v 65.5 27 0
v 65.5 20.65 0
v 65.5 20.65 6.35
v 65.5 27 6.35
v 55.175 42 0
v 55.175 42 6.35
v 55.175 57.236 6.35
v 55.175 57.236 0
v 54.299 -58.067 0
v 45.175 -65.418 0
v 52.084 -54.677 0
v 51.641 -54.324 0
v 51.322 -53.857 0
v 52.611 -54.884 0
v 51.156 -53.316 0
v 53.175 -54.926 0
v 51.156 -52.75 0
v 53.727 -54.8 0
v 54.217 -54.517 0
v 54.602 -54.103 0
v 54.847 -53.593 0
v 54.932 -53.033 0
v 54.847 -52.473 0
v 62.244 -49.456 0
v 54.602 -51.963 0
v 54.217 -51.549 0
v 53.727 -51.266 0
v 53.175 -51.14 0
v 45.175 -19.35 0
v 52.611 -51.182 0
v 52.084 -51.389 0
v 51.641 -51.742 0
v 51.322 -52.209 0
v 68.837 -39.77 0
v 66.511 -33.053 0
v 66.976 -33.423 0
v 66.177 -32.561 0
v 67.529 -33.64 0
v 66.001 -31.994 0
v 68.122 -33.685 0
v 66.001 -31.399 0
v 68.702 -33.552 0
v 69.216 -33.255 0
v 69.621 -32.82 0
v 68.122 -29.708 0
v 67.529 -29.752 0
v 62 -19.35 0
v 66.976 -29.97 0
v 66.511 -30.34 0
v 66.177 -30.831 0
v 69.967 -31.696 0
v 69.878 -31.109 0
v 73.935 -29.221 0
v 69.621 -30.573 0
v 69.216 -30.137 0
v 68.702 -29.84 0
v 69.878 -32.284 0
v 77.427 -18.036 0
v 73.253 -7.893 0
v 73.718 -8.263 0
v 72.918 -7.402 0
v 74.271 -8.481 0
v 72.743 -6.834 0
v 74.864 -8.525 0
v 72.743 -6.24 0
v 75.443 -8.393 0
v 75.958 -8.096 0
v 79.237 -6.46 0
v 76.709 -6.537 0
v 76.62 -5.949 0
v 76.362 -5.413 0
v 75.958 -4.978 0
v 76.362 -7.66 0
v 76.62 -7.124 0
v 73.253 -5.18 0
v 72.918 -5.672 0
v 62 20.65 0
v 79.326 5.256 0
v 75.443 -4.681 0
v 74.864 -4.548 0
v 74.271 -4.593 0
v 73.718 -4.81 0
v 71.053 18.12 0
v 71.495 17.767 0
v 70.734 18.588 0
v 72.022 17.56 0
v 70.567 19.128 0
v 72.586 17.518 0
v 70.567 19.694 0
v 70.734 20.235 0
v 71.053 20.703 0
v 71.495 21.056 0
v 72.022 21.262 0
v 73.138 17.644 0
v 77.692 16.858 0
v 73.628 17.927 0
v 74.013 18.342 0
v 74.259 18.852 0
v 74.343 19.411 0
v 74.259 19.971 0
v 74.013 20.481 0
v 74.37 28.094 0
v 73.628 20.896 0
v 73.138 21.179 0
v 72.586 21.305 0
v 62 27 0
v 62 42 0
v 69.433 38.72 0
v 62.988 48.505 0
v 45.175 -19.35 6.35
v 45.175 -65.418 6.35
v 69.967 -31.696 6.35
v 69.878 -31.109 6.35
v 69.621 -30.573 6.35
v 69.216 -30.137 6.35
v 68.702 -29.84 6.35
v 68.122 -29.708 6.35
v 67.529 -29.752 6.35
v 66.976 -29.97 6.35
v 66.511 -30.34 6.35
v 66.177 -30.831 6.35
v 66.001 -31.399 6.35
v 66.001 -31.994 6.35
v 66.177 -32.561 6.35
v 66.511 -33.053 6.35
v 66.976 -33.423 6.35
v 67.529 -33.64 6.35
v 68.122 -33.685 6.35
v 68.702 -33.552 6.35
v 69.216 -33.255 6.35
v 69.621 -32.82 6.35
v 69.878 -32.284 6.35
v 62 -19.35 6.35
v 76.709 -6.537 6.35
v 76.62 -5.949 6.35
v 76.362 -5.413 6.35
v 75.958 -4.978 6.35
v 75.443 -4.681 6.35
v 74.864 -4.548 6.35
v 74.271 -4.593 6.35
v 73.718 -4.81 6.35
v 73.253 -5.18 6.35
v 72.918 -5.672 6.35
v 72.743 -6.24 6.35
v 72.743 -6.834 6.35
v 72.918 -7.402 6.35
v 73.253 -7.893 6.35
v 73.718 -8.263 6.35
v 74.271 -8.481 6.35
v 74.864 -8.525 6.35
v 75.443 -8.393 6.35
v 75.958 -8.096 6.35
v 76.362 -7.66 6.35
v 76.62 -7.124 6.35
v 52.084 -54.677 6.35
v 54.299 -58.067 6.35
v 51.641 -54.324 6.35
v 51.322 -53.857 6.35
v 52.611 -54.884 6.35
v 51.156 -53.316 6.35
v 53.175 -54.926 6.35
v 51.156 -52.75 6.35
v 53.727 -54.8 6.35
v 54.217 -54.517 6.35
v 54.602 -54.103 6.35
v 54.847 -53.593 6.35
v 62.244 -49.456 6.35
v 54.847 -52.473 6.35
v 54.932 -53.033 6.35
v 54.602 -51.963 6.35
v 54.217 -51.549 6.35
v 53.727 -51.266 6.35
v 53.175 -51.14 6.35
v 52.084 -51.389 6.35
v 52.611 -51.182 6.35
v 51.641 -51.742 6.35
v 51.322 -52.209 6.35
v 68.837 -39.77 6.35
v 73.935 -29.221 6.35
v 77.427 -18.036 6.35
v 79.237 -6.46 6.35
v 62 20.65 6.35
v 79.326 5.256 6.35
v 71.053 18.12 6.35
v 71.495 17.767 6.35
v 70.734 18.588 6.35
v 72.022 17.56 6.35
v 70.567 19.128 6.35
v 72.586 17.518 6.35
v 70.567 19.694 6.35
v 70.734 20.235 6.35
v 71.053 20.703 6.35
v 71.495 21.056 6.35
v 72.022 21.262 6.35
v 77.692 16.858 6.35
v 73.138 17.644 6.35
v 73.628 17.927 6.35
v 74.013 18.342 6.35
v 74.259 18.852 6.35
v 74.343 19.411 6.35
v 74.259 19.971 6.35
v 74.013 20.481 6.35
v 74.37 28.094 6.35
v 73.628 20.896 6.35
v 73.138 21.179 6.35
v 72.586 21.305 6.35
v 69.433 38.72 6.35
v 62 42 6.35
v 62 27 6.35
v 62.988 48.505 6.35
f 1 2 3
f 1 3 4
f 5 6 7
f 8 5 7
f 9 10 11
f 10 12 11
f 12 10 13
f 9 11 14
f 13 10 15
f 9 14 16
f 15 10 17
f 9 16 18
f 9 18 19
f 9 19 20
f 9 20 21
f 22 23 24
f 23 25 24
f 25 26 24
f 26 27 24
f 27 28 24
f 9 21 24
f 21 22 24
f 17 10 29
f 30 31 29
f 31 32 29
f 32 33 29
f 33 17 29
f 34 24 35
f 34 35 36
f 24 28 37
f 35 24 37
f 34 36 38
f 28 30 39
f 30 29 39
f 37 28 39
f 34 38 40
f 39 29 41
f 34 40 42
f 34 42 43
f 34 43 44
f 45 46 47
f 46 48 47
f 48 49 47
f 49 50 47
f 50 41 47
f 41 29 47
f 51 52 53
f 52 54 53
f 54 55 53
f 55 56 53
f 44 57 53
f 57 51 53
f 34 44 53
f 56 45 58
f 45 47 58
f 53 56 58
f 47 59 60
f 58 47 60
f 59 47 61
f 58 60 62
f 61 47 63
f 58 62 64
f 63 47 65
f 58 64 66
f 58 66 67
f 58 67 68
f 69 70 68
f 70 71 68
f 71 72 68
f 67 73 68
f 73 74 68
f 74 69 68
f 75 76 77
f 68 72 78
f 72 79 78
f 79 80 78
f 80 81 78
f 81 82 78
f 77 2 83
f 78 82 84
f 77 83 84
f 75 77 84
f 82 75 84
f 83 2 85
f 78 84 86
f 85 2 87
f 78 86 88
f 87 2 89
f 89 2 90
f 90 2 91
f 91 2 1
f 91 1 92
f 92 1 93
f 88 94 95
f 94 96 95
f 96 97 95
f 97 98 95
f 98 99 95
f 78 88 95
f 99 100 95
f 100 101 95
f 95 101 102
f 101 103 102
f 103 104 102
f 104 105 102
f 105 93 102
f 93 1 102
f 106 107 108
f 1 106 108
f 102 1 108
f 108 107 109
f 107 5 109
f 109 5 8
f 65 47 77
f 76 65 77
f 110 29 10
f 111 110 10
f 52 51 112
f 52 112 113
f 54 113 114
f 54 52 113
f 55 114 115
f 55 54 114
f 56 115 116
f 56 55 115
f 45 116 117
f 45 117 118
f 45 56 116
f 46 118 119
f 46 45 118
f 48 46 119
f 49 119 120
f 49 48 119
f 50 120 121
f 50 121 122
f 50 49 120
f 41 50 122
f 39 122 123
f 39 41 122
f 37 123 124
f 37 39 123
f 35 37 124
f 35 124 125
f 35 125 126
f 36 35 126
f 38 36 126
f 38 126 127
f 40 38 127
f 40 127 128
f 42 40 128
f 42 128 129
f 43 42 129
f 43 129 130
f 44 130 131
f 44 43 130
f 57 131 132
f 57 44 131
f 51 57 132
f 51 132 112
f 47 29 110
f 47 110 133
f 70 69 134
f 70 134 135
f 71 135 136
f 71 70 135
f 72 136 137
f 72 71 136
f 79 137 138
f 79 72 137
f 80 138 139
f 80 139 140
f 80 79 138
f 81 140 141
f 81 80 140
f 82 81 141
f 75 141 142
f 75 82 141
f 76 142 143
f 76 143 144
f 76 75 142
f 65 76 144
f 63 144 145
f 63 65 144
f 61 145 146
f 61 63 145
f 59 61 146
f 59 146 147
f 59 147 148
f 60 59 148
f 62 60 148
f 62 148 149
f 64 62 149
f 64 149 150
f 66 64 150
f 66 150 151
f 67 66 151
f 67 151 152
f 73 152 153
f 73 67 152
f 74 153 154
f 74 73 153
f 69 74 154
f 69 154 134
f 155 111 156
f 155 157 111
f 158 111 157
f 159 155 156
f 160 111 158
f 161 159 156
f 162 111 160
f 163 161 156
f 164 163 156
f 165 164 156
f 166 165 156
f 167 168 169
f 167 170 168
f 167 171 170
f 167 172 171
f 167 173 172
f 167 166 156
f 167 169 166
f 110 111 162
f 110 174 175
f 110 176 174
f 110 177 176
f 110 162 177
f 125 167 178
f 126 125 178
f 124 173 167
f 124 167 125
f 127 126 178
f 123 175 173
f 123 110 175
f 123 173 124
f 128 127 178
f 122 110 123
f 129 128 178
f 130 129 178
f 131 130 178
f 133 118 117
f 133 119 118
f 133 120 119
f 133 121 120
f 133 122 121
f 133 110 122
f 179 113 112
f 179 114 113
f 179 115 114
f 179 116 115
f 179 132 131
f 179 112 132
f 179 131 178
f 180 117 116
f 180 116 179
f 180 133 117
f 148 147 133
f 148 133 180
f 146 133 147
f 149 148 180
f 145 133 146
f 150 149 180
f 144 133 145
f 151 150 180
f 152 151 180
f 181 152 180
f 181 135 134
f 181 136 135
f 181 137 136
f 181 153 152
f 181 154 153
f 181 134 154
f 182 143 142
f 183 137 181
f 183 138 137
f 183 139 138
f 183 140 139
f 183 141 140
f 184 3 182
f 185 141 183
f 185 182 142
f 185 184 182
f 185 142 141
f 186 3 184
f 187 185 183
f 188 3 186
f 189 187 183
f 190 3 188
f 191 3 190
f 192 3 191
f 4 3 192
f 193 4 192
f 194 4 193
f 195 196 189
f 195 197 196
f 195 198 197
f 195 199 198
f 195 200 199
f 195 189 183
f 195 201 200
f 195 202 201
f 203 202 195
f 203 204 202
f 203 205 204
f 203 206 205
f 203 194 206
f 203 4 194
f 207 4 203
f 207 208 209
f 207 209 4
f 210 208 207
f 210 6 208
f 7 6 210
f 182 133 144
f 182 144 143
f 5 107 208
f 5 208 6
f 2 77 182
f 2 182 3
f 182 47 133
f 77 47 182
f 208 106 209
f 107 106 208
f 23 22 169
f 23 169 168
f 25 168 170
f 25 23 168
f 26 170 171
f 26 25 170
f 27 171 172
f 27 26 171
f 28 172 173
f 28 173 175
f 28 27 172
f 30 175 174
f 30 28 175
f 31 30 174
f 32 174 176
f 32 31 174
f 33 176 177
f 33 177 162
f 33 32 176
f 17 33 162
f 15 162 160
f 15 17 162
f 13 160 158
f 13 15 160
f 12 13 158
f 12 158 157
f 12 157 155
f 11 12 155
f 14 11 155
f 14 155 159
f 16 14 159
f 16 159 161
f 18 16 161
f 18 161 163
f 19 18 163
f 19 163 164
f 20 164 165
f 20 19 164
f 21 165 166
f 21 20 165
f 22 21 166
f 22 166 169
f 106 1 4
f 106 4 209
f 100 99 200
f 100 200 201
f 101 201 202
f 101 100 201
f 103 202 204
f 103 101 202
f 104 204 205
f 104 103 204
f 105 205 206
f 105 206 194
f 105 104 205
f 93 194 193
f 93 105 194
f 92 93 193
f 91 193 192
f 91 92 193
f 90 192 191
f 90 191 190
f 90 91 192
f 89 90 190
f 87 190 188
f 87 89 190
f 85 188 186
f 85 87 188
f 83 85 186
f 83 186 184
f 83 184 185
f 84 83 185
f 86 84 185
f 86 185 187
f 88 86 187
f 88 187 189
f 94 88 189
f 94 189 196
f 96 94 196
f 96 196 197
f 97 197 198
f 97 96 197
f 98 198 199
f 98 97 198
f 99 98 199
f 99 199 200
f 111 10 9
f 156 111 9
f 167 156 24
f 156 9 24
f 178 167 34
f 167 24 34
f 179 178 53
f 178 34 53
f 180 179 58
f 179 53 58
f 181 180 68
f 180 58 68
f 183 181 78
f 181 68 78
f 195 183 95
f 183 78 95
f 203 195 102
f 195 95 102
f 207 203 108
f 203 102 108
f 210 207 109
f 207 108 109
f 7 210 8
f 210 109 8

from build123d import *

# Parameters (mm, degrees)
SKETCH1_R              = 79.5
SKETCH1_R_2            = 1.9939
SKETCH1_R_3            = 1.89865
SKETCH1_R_4            = 8
BOSS_EXTRUDE1_DEPTH    = 6.35
SKETCH5_W              = 15.2
SKETCH5_H              = 16.075
CUT_EXTRUDE4_DEPTH     = 113.609158153
SKETCH6_R              = 1
CUT_EXTRUDE5_DEPTH     = 113.609158153
FILLET1_R              = 1
SKETCH10_W             = 53.523609979
SKETCH10_H             = 37.243469735
SKETCH10_W_2           = 54.285324016
SKETCH10_H_2           = 37.23416744
BOSS_EXTRUDE2_DEPTH    = 6.35
SKETCH11_W             = 15.2
SKETCH11_H             = 6.55
CUT_EXTRUDE8_DEPTH     = 113.609158153
SKETCH13_R             = 1
CUT_EXTRUDE9_DEPTH     = 113.609158153
FILLET2_R              = 1
LPATTERN3_COUNT        = 2
LPATTERN3_PITCH        = 30
FILLET2_OF_LPATTERN3_R = 1
MIRROR3_DEPTH          = 6.35
CUT_EXTRUDE11_DEPTH    = 113.609158153
SKETCH15_W             = 6.35
SKETCH15_H             = 80
CUT_EXTRUDE12_DEPTH    = 113.609158153
CUT_EXTRUDE14_DEPTH    = 113.609158153
CUT_EXTRUDE18_DEPTH    = 104.150578646


# Read off the part's stored shape, not the designer's step: Mirror3
with BuildPart() as part:
    # Sketch1 → Boss-Extrude1 (new body)
    with BuildSketch(Plane.XY):
        Circle(SKETCH1_R)
        with Locations((74.714602357, -6.536680706)):
            Circle(SKETCH1_R_2, mode=Mode.SUBTRACT)
        with Locations((72.444436972, 19.411428383)):
            Circle(SKETCH1_R_3, mode=Mode.SUBTRACT)
        Circle(SKETCH1_R_4, mode=Mode.SUBTRACT)
        with Locations((67.973084028, -31.696369631)):
            Circle(SKETCH1_R_2, mode=Mode.SUBTRACT)
        with Locations((10.606601718, -10.606601718)):
            Circle(SKETCH1_R_2, mode=Mode.SUBTRACT)
        with Locations((0, -75)):
            Circle(SKETCH1_R_3, mode=Mode.SUBTRACT)
        with Locations((-10.606601718, -10.606601718)):
            Circle(SKETCH1_R_2, mode=Mode.SUBTRACT)
        with Locations((-10.606601718, 10.606601718)):
            Circle(SKETCH1_R_2, mode=Mode.SUBTRACT)
        with Locations((10.606601718, 10.606601718)):
            Circle(SKETCH1_R_2, mode=Mode.SUBTRACT)
        with Locations((-53.033008589, -53.033008589)):
            Circle(SKETCH1_R_3, mode=Mode.SUBTRACT)
        with Locations((-75, 0)):
            Circle(SKETCH1_R_3, mode=Mode.SUBTRACT)
        with Locations((-53.033008589, 53.033008589)):
            Circle(SKETCH1_R_3, mode=Mode.SUBTRACT)
        with Locations((0, 75)):
            Circle(SKETCH1_R_3, mode=Mode.SUBTRACT)
        with Locations((53.033008589, -53.033008589)):
            Circle(SKETCH1_R_3, mode=Mode.SUBTRACT)
    extrude(amount=BOSS_EXTRUDE1_DEPTH)

    # Sketch5 → Cut-Extrude4 (cut, through all)
    with BuildSketch(Plane.XY.offset(6.35)):
        with Locations((-30, -37.9375)):
            Rectangle(SKETCH5_W, SKETCH5_H)
        with Locations((-30, 37.9375)):
            Rectangle(SKETCH5_W, SKETCH5_H)
        with Locations((30, 37.9375)):
            Rectangle(SKETCH5_W, SKETCH5_H)
        with Locations((0, -37.9375)):
            Rectangle(SKETCH5_W, SKETCH5_H)
        with Locations((30, -37.9375)):
            Rectangle(SKETCH5_W, SKETCH5_H)
        with Locations((0, 37.9375)):
            Rectangle(SKETCH5_W, SKETCH5_H)
    extrude(amount=-CUT_EXTRUDE4_DEPTH, mode=Mode.SUBTRACT)

    # Sketch6 → Cut-Extrude5 (cut, through all)
    with BuildSketch(Plane.XY.offset(6.35)):
        with Locations((-37.6, 45.975)):
            Circle(SKETCH6_R)
        with Locations((-22.4, 45.975)):
            Circle(SKETCH6_R)
        with Locations((-37.6, 29.9)):
            Circle(SKETCH6_R)
        with Locations((-22.4, 29.9)):
            Circle(SKETCH6_R)
        with Locations((-7.6, 45.975)):
            Circle(SKETCH6_R)
        with Locations((7.6, 45.975)):
            Circle(SKETCH6_R)
        with Locations((-7.6, 29.9)):
            Circle(SKETCH6_R)
        with Locations((7.6, 29.9)):
            Circle(SKETCH6_R)
        with Locations((22.4, 45.975)):
            Circle(SKETCH6_R)
        with Locations((37.6, 45.975)):
            Circle(SKETCH6_R)
        with Locations((22.4, 29.9)):
            Circle(SKETCH6_R)
        with Locations((37.6, 29.9)):
            Circle(SKETCH6_R)
        with Locations((-37.6, -29.9)):
            Circle(SKETCH6_R)
        with Locations((-22.4, -29.9)):
            Circle(SKETCH6_R)
        with Locations((-37.6, -45.975)):
            Circle(SKETCH6_R)
        with Locations((-22.4, -45.975)):
            Circle(SKETCH6_R)
        with Locations((-7.6, -29.9)):
            Circle(SKETCH6_R)
        with Locations((7.6, -29.9)):
            Circle(SKETCH6_R)
        with Locations((-7.6, -45.975)):
            Circle(SKETCH6_R)
        with Locations((7.6, -45.975)):
            Circle(SKETCH6_R)
        with Locations((22.4, -29.9)):
            Circle(SKETCH6_R)
        with Locations((37.6, -29.9)):
            Circle(SKETCH6_R)
        with Locations((22.4, -45.975)):
            Circle(SKETCH6_R)
        with Locations((37.6, -45.975)):
            Circle(SKETCH6_R)
    extrude(amount=-CUT_EXTRUDE5_DEPTH, mode=Mode.SUBTRACT)

    # Fillet1
    fillet1_edges = [part.edges().sort_by_distance(p)[0] for p in [
        (-37.6, 44.975, 3.175),
        (-36.6, 45.975, 3.175),
        (-22.4, 44.975, 3.175),
        (-23.4, 45.975, 3.175),
        (-37.6, 30.9, 3.175),
        (-36.6, 29.9, 3.175),
        (-23.4, 29.9, 3.175),
        (-22.4, 30.9, 3.175),
        (-7.6, 44.975, 3.175),
        (-6.6, 45.975, 3.175),
        (7.6, 44.975, 3.175),
        (6.6, 45.975, 3.175),
        (-7.6, 30.9, 3.175),
        (-6.6, 29.9, 3.175),
        (6.6, 29.9, 3.175),
        (7.6, 30.9, 3.175),
        (22.4, 44.975, 3.175),
        (23.4, 45.975, 3.175),
        (37.6, 44.975, 3.175),
        (36.6, 45.975, 3.175),
        (22.4, 30.9, 3.175),
        (23.4, 29.9, 3.175),
        (36.6, 29.9, 3.175),
        (37.6, 30.9, 3.175),
        (-36.6, -29.9, 3.175),
        (-37.6, -30.9, 3.175),
        (-22.4, -30.9, 3.175),
        (-23.4, -29.9, 3.175),
        (-36.6, -45.975, 3.175),
        (-37.6, -44.975, 3.175),
        (-23.4, -45.975, 3.175),
        (-22.4, -44.975, 3.175),
        (-6.6, -29.9, 3.175),
        (-7.6, -30.9, 3.175),
        (7.6, -30.9, 3.175),
        (6.6, -29.9, 3.175),
        (-6.6, -45.975, 3.175),
        (-7.6, -44.975, 3.175),
        (6.6, -45.975, 3.175),
        (7.6, -44.975, 3.175),
        (23.4, -29.9, 3.175),
        (22.4, -30.9, 3.175),
        (37.6, -30.9, 3.175),
        (36.6, -29.9, 3.175),
        (23.4, -45.975, 3.175),
        (22.4, -44.975, 3.175),
        (36.6, -45.975, 3.175),
        (37.6, -44.975, 3.175),
    ]]
    fillet(fillet1_edges, radius=FILLET1_R)

    # Sketch10 → Boss-Extrude2 (add, through all)
    with BuildSketch(Plane(origin=(0, 0, 0), x_dir=(-1, 0, 0), z_dir=(0, 0, -1))):
        with Locations((-13.786008458, 43.712822415)):
            Rectangle(SKETCH10_W, SKETCH10_H)
        with Locations((-15.177733449, -42.065637654)):
            Rectangle(SKETCH10_W_2, SKETCH10_H_2)
    extrude(amount=-BOSS_EXTRUDE2_DEPTH)

    # Sketch11 → Cut-Extrude8 (cut, through all)
    with BuildSketch(Plane(origin=(0, 0, 0), x_dir=(-1, 0, 0), z_dir=(0, 0, -1))):
        with Locations((0, 33.175)):
            Rectangle(SKETCH11_W, SKETCH11_H)
    cut_extrude8 = extrude(amount=-CUT_EXTRUDE8_DEPTH, mode=Mode.SUBTRACT)

    # Sketch13 → Cut-Extrude9 (cut, through all)
    with BuildSketch(Plane(origin=(0, 0, 0), x_dir=(-1, 0, 0), z_dir=(0, 0, -1))):
        with Locations((-7.6, 36.45)):
            Circle(SKETCH13_R)
        with Locations((-7.6, 29.9)):
            Circle(SKETCH13_R)
        with Locations((7.6, 29.9)):
            Circle(SKETCH13_R)
        with Locations((7.6, 36.45)):
            Circle(SKETCH13_R)
    cut_extrude9 = extrude(amount=-CUT_EXTRUDE9_DEPTH, mode=Mode.SUBTRACT)

    # Fillet2
    fillet2_edges = [part.edges().sort_by_distance(p)[0] for p in [
        (6.6, 36.45, 3.175),
        (7.6, 35.45, 3.175),
        (-6.6, 36.45, 3.175),
        (7.6, 30.9, 3.175),
        (-6.6, 29.9, 3.175),
        (6.6, 29.9, 3.175),
        (-7.6, 30.9, 3.175),
        (-7.6, 35.45, 3.175),
    ]]
    fillet(fillet2_edges, radius=FILLET2_R)

    # LPattern3: Cut-Extrude8, Cut-Extrude9 ×2
    with Locations(*[(i * LPATTERN3_PITCH, 0, 0) for i in range(1, LPATTERN3_COUNT)]):
        add(cut_extrude8, mode=Mode.SUBTRACT)
        add(cut_extrude9, mode=Mode.SUBTRACT)

    # Fillet2 of LPattern3
    fillet2_of_lpattern3_edges = [part.edges().sort_by_distance(p)[0] for p in [
        (36.6, 36.45, 3.175),
        (37.6, 35.45, 3.175),
        (23.4, 36.45, 3.175),
        (37.6, 30.9, 3.175),
        (23.4, 29.9, 3.175),
        (36.6, 29.9, 3.175),
        (22.4, 30.9, 3.175),
        (22.4, 35.45, 3.175),
    ]]
    fillet(fillet2_of_lpattern3_edges, radius=FILLET2_OF_LPATTERN3_R)

    # Mirror3 outline → Mirror3 (cut)
    with BuildSketch(Plane.XY):
        with BuildLine():
            Line((-5.867949192, -36.45), (5.867949192, -36.45))
            ThreePointArc((5.867949192, -36.45), (6.367949192, -36.583974596), (6.733974596, -36.95))
            ThreePointArc((6.733974596, -36.95), (8.307106781, -37.157106781), (8.1, -35.583974596))
            ThreePointArc((8.1, -35.583974596), (7.733974596, -35.217949192), (7.6, -34.717949192))
            Line((7.6, -34.717949192), (7.6, -31.632050808))
            ThreePointArc((7.6, -31.632050808), (7.733974596, -31.132050808), (8.1, -30.766025404))
            ThreePointArc((8.1, -30.766025404), (8.307106781, -29.192893219), (6.733974596, -29.4))
            ThreePointArc((6.733974596, -29.4), (6.367949192, -29.766025404), (5.867949192, -29.9))
            Line((5.867949192, -29.9), (-5.867949192, -29.9))
            ThreePointArc((-5.867949192, -29.9), (-6.367949192, -29.766025404), (-6.733974596, -29.4))
            ThreePointArc((-6.733974596, -29.4), (-8.307106781, -29.192893219), (-8.1, -30.766025404))
            ThreePointArc((-8.1, -30.766025404), (-7.733974596, -31.132050808), (-7.6, -31.632050808))
            Line((-7.6, -31.632050808), (-7.6, -34.717949192))
            ThreePointArc((-7.6, -34.717949192), (-7.733974596, -35.217949192), (-8.1, -35.583974596))
            ThreePointArc((-8.1, -35.583974596), (-8.307106781, -37.157106781), (-6.733974596, -36.95))
            ThreePointArc((-6.733974596, -36.95), (-6.367949192, -36.583974596), (-5.867949192, -36.45))
        make_face()
        with BuildLine():
            Line((24.132050808, -36.45), (35.867949192, -36.45))
            ThreePointArc((35.867949192, -36.45), (36.367949192, -36.583974596), (36.733974596, -36.95))
            ThreePointArc((36.733974596, -36.95), (38.307106781, -37.157106781), (38.1, -35.583974596))
            ThreePointArc((38.1, -35.583974596), (37.733974596, -35.217949192), (37.6, -34.717949192))
            Line((37.6, -34.717949192), (37.6, -31.632050808))
            ThreePointArc((37.6, -31.632050808), (37.733974596, -31.132050808), (38.1, -30.766025404))
            ThreePointArc((38.1, -30.766025404), (38.307106781, -29.192893219), (36.733974596, -29.4))
            ThreePointArc((36.733974596, -29.4), (36.367949192, -29.766025404), (35.867949192, -29.9))
            Line((35.867949192, -29.9), (24.132050808, -29.9))
            ThreePointArc((24.132050808, -29.9), (23.632050808, -29.766025404), (23.266025404, -29.4))
            ThreePointArc((23.266025404, -29.4), (21.692893219, -29.192893219), (21.9, -30.766025404))
            ThreePointArc((21.9, -30.766025404), (22.266025404, -31.132050808), (22.4, -31.632050808))
            Line((22.4, -31.632050808), (22.4, -34.717949192))
            ThreePointArc((22.4, -34.717949192), (22.266025404, -35.217949192), (21.9, -35.583974596))
            ThreePointArc((21.9, -35.583974596), (21.692893219, -37.157106781), (23.266025404, -36.95))
            ThreePointArc((23.266025404, -36.95), (23.632050808, -36.583974596), (24.132050808, -36.45))
        make_face()
    extrude(amount=MIRROR3_DEPTH, mode=Mode.SUBTRACT)

    # Sketch14 → Cut-Extrude11 (cut, through all)
    with BuildSketch(Plane.XY):
        Polygon((33.5, -19.35), (62, -19.35), (62, 20.65), (65.5, 20.65), (65.5, 27), (62, 27), (62, 42), (42, 42), (42, 27), (38.5, 27), (38.5, 20.65), (42, 20.65), (42, 15.65), (33.5, 15.65), align=None)
    extrude(amount=CUT_EXTRUDE11_DEPTH, mode=Mode.SUBTRACT)

    # Sketch15 → Cut-Extrude12 (cut, through all)
    with BuildSketch(Plane.XY.offset(6.35)):
        with Locations((52, 42)):
            Rectangle(SKETCH15_W, SKETCH15_H)
    extrude(amount=-CUT_EXTRUDE12_DEPTH, mode=Mode.SUBTRACT)

    # Sketch16 → Cut-Extrude14 (cut, through all)
    with BuildSketch(Plane.XY):
        with BuildLine():
            Line((42, -37.5), (42, -14.02059918))
            Line((42, -14.02059918), (45.175, -14.029540215))
            Line((45.175, -14.029540215), (45.175, -79.5))
            Line((45.175, -79.5), (0, -79.5))
            ThreePointArc((0, -79.5), (29.69848481, -67.19848481), (42, -37.5))
        make_face()
        with BuildLine():
            Line((0, 79.5), (45.175, 79.5))
            Line((45.175, 79.5), (45.175, 14.029540215))
            Line((45.175, 14.029540215), (42, 14.02059918))
            Line((42, 14.02059918), (42, 37.5))
            ThreePointArc((42, 37.5), (29.69848481, 67.19848481), (0, 79.5))
        make_face()
    extrude(amount=CUT_EXTRUDE14_DEPTH, mode=Mode.SUBTRACT)


with BuildPart() as cut_extrude14_piece_1:
    # of the separate pieces the step leaves, piece 1, a body of its own (cut_extrude14_pieces_kept)
    add(part.part.solids().sort_by_distance((45.175, -65.41765339, 6.35))[0])


with BuildPart() as cut_extrude14_piece_2:
    # of the separate pieces the step leaves, piece 2, a body of its own (cut_extrude14_pieces_kept)
    add(part.part.solids().sort_by_distance((48.825, 62.740492308, 6.35))[0])

    # Sketch24 → Cut-Extrude18 (cut, through all)
    with BuildSketch(Plane.XY.offset(6.35)):
        with BuildLine():
            Line((45.175, 65.41765339), (45.175, 42))
            Line((45.175, 42), (48.825, 42))
            Line((48.825, 42), (48.825, 62.740492308))
            ThreePointArc((48.825, 62.740492308), (47.019057816, 64.10505598), (45.175, 65.41765339))
        make_face()
    extrude(amount=-CUT_EXTRUDE18_DEPTH, mode=Mode.SUBTRACT)


solid = cut_extrude14_piece_1.part
